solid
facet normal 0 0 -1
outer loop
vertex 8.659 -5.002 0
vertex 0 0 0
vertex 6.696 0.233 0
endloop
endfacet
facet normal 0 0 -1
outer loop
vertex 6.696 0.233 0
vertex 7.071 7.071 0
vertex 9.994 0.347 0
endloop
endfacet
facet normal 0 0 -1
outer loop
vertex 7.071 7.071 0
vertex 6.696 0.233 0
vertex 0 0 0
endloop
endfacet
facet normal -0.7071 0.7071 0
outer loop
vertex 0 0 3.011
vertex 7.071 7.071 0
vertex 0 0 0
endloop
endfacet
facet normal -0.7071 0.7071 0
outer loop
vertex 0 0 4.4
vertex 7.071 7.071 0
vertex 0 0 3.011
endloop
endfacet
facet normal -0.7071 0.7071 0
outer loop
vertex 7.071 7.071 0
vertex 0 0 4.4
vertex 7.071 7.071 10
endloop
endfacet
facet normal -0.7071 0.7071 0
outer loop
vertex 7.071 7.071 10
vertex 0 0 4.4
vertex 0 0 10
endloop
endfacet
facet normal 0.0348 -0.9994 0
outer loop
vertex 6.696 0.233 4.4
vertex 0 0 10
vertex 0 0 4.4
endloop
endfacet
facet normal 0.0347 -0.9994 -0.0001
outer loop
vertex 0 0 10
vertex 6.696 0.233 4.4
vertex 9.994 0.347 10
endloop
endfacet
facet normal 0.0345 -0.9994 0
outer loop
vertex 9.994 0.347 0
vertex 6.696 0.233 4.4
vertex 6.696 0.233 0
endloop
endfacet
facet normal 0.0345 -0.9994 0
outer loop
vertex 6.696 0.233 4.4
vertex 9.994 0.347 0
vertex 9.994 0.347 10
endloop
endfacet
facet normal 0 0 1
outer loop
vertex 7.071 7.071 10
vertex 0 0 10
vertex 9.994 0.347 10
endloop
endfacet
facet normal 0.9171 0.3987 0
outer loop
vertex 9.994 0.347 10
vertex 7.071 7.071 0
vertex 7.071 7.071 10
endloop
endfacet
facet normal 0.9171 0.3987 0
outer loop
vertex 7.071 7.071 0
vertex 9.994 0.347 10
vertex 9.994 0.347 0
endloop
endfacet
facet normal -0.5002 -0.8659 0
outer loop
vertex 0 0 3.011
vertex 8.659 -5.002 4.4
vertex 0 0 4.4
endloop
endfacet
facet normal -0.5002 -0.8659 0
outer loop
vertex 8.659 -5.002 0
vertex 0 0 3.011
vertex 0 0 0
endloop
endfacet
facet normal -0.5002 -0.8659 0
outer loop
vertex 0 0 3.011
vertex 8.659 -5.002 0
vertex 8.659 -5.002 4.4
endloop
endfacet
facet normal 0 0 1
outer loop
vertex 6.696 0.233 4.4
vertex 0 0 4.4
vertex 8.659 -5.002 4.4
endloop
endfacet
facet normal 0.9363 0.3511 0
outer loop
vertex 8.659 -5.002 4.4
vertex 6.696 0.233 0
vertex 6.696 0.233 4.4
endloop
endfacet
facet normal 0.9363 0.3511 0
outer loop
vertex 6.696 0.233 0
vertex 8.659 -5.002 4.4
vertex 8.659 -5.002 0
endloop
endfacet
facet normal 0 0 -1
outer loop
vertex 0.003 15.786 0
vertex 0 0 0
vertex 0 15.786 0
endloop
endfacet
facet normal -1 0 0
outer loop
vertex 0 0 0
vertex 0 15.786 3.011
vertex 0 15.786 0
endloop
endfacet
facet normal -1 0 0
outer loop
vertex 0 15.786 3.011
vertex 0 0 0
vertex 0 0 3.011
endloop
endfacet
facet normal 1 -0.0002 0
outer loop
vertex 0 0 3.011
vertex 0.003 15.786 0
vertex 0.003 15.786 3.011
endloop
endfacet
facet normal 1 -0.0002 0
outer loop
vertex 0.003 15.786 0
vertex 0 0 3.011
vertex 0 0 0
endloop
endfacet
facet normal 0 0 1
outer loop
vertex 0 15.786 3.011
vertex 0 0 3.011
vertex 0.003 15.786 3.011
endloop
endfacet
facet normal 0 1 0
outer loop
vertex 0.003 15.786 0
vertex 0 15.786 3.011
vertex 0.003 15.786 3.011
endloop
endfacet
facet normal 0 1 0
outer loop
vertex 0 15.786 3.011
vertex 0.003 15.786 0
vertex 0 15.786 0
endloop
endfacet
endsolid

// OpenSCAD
linear_extrude(height = 10, center = false, convexity = 10, twist = 0)

polygon(points=[[0,0],[sin(45)*10,cos(45)*10],[sin(88.01)*10,cos(88.01)*10]], paths=[[0,1,2]]);

linear_extrude(height = 4.4, center = false, convexity = 10, twist = 0)
polygon(points=[[0,0],[sin(88)*6.7,cos(88)*6.7],[sin(120.01)*10,cos(120.01)*10]], paths=[[0,1,2]]);

// polygon(points=[[0,0],[77,0],[0,100]], paths=[[0,1,2]]);



for (i = [0:366:1]) {
    h = rands(0,10,1)[0];
    length = rands(0,40,1)[0];
    linear_extrude(height = h, center = false, convexity = 10, twist = 0)
    
    polygon(points=[[0,0],[sin(i)*length,cos(i)*length],[sin(i + 0.01)*length,cos(i + .01)*length]], paths=[[0,1,2]]);
    
}
